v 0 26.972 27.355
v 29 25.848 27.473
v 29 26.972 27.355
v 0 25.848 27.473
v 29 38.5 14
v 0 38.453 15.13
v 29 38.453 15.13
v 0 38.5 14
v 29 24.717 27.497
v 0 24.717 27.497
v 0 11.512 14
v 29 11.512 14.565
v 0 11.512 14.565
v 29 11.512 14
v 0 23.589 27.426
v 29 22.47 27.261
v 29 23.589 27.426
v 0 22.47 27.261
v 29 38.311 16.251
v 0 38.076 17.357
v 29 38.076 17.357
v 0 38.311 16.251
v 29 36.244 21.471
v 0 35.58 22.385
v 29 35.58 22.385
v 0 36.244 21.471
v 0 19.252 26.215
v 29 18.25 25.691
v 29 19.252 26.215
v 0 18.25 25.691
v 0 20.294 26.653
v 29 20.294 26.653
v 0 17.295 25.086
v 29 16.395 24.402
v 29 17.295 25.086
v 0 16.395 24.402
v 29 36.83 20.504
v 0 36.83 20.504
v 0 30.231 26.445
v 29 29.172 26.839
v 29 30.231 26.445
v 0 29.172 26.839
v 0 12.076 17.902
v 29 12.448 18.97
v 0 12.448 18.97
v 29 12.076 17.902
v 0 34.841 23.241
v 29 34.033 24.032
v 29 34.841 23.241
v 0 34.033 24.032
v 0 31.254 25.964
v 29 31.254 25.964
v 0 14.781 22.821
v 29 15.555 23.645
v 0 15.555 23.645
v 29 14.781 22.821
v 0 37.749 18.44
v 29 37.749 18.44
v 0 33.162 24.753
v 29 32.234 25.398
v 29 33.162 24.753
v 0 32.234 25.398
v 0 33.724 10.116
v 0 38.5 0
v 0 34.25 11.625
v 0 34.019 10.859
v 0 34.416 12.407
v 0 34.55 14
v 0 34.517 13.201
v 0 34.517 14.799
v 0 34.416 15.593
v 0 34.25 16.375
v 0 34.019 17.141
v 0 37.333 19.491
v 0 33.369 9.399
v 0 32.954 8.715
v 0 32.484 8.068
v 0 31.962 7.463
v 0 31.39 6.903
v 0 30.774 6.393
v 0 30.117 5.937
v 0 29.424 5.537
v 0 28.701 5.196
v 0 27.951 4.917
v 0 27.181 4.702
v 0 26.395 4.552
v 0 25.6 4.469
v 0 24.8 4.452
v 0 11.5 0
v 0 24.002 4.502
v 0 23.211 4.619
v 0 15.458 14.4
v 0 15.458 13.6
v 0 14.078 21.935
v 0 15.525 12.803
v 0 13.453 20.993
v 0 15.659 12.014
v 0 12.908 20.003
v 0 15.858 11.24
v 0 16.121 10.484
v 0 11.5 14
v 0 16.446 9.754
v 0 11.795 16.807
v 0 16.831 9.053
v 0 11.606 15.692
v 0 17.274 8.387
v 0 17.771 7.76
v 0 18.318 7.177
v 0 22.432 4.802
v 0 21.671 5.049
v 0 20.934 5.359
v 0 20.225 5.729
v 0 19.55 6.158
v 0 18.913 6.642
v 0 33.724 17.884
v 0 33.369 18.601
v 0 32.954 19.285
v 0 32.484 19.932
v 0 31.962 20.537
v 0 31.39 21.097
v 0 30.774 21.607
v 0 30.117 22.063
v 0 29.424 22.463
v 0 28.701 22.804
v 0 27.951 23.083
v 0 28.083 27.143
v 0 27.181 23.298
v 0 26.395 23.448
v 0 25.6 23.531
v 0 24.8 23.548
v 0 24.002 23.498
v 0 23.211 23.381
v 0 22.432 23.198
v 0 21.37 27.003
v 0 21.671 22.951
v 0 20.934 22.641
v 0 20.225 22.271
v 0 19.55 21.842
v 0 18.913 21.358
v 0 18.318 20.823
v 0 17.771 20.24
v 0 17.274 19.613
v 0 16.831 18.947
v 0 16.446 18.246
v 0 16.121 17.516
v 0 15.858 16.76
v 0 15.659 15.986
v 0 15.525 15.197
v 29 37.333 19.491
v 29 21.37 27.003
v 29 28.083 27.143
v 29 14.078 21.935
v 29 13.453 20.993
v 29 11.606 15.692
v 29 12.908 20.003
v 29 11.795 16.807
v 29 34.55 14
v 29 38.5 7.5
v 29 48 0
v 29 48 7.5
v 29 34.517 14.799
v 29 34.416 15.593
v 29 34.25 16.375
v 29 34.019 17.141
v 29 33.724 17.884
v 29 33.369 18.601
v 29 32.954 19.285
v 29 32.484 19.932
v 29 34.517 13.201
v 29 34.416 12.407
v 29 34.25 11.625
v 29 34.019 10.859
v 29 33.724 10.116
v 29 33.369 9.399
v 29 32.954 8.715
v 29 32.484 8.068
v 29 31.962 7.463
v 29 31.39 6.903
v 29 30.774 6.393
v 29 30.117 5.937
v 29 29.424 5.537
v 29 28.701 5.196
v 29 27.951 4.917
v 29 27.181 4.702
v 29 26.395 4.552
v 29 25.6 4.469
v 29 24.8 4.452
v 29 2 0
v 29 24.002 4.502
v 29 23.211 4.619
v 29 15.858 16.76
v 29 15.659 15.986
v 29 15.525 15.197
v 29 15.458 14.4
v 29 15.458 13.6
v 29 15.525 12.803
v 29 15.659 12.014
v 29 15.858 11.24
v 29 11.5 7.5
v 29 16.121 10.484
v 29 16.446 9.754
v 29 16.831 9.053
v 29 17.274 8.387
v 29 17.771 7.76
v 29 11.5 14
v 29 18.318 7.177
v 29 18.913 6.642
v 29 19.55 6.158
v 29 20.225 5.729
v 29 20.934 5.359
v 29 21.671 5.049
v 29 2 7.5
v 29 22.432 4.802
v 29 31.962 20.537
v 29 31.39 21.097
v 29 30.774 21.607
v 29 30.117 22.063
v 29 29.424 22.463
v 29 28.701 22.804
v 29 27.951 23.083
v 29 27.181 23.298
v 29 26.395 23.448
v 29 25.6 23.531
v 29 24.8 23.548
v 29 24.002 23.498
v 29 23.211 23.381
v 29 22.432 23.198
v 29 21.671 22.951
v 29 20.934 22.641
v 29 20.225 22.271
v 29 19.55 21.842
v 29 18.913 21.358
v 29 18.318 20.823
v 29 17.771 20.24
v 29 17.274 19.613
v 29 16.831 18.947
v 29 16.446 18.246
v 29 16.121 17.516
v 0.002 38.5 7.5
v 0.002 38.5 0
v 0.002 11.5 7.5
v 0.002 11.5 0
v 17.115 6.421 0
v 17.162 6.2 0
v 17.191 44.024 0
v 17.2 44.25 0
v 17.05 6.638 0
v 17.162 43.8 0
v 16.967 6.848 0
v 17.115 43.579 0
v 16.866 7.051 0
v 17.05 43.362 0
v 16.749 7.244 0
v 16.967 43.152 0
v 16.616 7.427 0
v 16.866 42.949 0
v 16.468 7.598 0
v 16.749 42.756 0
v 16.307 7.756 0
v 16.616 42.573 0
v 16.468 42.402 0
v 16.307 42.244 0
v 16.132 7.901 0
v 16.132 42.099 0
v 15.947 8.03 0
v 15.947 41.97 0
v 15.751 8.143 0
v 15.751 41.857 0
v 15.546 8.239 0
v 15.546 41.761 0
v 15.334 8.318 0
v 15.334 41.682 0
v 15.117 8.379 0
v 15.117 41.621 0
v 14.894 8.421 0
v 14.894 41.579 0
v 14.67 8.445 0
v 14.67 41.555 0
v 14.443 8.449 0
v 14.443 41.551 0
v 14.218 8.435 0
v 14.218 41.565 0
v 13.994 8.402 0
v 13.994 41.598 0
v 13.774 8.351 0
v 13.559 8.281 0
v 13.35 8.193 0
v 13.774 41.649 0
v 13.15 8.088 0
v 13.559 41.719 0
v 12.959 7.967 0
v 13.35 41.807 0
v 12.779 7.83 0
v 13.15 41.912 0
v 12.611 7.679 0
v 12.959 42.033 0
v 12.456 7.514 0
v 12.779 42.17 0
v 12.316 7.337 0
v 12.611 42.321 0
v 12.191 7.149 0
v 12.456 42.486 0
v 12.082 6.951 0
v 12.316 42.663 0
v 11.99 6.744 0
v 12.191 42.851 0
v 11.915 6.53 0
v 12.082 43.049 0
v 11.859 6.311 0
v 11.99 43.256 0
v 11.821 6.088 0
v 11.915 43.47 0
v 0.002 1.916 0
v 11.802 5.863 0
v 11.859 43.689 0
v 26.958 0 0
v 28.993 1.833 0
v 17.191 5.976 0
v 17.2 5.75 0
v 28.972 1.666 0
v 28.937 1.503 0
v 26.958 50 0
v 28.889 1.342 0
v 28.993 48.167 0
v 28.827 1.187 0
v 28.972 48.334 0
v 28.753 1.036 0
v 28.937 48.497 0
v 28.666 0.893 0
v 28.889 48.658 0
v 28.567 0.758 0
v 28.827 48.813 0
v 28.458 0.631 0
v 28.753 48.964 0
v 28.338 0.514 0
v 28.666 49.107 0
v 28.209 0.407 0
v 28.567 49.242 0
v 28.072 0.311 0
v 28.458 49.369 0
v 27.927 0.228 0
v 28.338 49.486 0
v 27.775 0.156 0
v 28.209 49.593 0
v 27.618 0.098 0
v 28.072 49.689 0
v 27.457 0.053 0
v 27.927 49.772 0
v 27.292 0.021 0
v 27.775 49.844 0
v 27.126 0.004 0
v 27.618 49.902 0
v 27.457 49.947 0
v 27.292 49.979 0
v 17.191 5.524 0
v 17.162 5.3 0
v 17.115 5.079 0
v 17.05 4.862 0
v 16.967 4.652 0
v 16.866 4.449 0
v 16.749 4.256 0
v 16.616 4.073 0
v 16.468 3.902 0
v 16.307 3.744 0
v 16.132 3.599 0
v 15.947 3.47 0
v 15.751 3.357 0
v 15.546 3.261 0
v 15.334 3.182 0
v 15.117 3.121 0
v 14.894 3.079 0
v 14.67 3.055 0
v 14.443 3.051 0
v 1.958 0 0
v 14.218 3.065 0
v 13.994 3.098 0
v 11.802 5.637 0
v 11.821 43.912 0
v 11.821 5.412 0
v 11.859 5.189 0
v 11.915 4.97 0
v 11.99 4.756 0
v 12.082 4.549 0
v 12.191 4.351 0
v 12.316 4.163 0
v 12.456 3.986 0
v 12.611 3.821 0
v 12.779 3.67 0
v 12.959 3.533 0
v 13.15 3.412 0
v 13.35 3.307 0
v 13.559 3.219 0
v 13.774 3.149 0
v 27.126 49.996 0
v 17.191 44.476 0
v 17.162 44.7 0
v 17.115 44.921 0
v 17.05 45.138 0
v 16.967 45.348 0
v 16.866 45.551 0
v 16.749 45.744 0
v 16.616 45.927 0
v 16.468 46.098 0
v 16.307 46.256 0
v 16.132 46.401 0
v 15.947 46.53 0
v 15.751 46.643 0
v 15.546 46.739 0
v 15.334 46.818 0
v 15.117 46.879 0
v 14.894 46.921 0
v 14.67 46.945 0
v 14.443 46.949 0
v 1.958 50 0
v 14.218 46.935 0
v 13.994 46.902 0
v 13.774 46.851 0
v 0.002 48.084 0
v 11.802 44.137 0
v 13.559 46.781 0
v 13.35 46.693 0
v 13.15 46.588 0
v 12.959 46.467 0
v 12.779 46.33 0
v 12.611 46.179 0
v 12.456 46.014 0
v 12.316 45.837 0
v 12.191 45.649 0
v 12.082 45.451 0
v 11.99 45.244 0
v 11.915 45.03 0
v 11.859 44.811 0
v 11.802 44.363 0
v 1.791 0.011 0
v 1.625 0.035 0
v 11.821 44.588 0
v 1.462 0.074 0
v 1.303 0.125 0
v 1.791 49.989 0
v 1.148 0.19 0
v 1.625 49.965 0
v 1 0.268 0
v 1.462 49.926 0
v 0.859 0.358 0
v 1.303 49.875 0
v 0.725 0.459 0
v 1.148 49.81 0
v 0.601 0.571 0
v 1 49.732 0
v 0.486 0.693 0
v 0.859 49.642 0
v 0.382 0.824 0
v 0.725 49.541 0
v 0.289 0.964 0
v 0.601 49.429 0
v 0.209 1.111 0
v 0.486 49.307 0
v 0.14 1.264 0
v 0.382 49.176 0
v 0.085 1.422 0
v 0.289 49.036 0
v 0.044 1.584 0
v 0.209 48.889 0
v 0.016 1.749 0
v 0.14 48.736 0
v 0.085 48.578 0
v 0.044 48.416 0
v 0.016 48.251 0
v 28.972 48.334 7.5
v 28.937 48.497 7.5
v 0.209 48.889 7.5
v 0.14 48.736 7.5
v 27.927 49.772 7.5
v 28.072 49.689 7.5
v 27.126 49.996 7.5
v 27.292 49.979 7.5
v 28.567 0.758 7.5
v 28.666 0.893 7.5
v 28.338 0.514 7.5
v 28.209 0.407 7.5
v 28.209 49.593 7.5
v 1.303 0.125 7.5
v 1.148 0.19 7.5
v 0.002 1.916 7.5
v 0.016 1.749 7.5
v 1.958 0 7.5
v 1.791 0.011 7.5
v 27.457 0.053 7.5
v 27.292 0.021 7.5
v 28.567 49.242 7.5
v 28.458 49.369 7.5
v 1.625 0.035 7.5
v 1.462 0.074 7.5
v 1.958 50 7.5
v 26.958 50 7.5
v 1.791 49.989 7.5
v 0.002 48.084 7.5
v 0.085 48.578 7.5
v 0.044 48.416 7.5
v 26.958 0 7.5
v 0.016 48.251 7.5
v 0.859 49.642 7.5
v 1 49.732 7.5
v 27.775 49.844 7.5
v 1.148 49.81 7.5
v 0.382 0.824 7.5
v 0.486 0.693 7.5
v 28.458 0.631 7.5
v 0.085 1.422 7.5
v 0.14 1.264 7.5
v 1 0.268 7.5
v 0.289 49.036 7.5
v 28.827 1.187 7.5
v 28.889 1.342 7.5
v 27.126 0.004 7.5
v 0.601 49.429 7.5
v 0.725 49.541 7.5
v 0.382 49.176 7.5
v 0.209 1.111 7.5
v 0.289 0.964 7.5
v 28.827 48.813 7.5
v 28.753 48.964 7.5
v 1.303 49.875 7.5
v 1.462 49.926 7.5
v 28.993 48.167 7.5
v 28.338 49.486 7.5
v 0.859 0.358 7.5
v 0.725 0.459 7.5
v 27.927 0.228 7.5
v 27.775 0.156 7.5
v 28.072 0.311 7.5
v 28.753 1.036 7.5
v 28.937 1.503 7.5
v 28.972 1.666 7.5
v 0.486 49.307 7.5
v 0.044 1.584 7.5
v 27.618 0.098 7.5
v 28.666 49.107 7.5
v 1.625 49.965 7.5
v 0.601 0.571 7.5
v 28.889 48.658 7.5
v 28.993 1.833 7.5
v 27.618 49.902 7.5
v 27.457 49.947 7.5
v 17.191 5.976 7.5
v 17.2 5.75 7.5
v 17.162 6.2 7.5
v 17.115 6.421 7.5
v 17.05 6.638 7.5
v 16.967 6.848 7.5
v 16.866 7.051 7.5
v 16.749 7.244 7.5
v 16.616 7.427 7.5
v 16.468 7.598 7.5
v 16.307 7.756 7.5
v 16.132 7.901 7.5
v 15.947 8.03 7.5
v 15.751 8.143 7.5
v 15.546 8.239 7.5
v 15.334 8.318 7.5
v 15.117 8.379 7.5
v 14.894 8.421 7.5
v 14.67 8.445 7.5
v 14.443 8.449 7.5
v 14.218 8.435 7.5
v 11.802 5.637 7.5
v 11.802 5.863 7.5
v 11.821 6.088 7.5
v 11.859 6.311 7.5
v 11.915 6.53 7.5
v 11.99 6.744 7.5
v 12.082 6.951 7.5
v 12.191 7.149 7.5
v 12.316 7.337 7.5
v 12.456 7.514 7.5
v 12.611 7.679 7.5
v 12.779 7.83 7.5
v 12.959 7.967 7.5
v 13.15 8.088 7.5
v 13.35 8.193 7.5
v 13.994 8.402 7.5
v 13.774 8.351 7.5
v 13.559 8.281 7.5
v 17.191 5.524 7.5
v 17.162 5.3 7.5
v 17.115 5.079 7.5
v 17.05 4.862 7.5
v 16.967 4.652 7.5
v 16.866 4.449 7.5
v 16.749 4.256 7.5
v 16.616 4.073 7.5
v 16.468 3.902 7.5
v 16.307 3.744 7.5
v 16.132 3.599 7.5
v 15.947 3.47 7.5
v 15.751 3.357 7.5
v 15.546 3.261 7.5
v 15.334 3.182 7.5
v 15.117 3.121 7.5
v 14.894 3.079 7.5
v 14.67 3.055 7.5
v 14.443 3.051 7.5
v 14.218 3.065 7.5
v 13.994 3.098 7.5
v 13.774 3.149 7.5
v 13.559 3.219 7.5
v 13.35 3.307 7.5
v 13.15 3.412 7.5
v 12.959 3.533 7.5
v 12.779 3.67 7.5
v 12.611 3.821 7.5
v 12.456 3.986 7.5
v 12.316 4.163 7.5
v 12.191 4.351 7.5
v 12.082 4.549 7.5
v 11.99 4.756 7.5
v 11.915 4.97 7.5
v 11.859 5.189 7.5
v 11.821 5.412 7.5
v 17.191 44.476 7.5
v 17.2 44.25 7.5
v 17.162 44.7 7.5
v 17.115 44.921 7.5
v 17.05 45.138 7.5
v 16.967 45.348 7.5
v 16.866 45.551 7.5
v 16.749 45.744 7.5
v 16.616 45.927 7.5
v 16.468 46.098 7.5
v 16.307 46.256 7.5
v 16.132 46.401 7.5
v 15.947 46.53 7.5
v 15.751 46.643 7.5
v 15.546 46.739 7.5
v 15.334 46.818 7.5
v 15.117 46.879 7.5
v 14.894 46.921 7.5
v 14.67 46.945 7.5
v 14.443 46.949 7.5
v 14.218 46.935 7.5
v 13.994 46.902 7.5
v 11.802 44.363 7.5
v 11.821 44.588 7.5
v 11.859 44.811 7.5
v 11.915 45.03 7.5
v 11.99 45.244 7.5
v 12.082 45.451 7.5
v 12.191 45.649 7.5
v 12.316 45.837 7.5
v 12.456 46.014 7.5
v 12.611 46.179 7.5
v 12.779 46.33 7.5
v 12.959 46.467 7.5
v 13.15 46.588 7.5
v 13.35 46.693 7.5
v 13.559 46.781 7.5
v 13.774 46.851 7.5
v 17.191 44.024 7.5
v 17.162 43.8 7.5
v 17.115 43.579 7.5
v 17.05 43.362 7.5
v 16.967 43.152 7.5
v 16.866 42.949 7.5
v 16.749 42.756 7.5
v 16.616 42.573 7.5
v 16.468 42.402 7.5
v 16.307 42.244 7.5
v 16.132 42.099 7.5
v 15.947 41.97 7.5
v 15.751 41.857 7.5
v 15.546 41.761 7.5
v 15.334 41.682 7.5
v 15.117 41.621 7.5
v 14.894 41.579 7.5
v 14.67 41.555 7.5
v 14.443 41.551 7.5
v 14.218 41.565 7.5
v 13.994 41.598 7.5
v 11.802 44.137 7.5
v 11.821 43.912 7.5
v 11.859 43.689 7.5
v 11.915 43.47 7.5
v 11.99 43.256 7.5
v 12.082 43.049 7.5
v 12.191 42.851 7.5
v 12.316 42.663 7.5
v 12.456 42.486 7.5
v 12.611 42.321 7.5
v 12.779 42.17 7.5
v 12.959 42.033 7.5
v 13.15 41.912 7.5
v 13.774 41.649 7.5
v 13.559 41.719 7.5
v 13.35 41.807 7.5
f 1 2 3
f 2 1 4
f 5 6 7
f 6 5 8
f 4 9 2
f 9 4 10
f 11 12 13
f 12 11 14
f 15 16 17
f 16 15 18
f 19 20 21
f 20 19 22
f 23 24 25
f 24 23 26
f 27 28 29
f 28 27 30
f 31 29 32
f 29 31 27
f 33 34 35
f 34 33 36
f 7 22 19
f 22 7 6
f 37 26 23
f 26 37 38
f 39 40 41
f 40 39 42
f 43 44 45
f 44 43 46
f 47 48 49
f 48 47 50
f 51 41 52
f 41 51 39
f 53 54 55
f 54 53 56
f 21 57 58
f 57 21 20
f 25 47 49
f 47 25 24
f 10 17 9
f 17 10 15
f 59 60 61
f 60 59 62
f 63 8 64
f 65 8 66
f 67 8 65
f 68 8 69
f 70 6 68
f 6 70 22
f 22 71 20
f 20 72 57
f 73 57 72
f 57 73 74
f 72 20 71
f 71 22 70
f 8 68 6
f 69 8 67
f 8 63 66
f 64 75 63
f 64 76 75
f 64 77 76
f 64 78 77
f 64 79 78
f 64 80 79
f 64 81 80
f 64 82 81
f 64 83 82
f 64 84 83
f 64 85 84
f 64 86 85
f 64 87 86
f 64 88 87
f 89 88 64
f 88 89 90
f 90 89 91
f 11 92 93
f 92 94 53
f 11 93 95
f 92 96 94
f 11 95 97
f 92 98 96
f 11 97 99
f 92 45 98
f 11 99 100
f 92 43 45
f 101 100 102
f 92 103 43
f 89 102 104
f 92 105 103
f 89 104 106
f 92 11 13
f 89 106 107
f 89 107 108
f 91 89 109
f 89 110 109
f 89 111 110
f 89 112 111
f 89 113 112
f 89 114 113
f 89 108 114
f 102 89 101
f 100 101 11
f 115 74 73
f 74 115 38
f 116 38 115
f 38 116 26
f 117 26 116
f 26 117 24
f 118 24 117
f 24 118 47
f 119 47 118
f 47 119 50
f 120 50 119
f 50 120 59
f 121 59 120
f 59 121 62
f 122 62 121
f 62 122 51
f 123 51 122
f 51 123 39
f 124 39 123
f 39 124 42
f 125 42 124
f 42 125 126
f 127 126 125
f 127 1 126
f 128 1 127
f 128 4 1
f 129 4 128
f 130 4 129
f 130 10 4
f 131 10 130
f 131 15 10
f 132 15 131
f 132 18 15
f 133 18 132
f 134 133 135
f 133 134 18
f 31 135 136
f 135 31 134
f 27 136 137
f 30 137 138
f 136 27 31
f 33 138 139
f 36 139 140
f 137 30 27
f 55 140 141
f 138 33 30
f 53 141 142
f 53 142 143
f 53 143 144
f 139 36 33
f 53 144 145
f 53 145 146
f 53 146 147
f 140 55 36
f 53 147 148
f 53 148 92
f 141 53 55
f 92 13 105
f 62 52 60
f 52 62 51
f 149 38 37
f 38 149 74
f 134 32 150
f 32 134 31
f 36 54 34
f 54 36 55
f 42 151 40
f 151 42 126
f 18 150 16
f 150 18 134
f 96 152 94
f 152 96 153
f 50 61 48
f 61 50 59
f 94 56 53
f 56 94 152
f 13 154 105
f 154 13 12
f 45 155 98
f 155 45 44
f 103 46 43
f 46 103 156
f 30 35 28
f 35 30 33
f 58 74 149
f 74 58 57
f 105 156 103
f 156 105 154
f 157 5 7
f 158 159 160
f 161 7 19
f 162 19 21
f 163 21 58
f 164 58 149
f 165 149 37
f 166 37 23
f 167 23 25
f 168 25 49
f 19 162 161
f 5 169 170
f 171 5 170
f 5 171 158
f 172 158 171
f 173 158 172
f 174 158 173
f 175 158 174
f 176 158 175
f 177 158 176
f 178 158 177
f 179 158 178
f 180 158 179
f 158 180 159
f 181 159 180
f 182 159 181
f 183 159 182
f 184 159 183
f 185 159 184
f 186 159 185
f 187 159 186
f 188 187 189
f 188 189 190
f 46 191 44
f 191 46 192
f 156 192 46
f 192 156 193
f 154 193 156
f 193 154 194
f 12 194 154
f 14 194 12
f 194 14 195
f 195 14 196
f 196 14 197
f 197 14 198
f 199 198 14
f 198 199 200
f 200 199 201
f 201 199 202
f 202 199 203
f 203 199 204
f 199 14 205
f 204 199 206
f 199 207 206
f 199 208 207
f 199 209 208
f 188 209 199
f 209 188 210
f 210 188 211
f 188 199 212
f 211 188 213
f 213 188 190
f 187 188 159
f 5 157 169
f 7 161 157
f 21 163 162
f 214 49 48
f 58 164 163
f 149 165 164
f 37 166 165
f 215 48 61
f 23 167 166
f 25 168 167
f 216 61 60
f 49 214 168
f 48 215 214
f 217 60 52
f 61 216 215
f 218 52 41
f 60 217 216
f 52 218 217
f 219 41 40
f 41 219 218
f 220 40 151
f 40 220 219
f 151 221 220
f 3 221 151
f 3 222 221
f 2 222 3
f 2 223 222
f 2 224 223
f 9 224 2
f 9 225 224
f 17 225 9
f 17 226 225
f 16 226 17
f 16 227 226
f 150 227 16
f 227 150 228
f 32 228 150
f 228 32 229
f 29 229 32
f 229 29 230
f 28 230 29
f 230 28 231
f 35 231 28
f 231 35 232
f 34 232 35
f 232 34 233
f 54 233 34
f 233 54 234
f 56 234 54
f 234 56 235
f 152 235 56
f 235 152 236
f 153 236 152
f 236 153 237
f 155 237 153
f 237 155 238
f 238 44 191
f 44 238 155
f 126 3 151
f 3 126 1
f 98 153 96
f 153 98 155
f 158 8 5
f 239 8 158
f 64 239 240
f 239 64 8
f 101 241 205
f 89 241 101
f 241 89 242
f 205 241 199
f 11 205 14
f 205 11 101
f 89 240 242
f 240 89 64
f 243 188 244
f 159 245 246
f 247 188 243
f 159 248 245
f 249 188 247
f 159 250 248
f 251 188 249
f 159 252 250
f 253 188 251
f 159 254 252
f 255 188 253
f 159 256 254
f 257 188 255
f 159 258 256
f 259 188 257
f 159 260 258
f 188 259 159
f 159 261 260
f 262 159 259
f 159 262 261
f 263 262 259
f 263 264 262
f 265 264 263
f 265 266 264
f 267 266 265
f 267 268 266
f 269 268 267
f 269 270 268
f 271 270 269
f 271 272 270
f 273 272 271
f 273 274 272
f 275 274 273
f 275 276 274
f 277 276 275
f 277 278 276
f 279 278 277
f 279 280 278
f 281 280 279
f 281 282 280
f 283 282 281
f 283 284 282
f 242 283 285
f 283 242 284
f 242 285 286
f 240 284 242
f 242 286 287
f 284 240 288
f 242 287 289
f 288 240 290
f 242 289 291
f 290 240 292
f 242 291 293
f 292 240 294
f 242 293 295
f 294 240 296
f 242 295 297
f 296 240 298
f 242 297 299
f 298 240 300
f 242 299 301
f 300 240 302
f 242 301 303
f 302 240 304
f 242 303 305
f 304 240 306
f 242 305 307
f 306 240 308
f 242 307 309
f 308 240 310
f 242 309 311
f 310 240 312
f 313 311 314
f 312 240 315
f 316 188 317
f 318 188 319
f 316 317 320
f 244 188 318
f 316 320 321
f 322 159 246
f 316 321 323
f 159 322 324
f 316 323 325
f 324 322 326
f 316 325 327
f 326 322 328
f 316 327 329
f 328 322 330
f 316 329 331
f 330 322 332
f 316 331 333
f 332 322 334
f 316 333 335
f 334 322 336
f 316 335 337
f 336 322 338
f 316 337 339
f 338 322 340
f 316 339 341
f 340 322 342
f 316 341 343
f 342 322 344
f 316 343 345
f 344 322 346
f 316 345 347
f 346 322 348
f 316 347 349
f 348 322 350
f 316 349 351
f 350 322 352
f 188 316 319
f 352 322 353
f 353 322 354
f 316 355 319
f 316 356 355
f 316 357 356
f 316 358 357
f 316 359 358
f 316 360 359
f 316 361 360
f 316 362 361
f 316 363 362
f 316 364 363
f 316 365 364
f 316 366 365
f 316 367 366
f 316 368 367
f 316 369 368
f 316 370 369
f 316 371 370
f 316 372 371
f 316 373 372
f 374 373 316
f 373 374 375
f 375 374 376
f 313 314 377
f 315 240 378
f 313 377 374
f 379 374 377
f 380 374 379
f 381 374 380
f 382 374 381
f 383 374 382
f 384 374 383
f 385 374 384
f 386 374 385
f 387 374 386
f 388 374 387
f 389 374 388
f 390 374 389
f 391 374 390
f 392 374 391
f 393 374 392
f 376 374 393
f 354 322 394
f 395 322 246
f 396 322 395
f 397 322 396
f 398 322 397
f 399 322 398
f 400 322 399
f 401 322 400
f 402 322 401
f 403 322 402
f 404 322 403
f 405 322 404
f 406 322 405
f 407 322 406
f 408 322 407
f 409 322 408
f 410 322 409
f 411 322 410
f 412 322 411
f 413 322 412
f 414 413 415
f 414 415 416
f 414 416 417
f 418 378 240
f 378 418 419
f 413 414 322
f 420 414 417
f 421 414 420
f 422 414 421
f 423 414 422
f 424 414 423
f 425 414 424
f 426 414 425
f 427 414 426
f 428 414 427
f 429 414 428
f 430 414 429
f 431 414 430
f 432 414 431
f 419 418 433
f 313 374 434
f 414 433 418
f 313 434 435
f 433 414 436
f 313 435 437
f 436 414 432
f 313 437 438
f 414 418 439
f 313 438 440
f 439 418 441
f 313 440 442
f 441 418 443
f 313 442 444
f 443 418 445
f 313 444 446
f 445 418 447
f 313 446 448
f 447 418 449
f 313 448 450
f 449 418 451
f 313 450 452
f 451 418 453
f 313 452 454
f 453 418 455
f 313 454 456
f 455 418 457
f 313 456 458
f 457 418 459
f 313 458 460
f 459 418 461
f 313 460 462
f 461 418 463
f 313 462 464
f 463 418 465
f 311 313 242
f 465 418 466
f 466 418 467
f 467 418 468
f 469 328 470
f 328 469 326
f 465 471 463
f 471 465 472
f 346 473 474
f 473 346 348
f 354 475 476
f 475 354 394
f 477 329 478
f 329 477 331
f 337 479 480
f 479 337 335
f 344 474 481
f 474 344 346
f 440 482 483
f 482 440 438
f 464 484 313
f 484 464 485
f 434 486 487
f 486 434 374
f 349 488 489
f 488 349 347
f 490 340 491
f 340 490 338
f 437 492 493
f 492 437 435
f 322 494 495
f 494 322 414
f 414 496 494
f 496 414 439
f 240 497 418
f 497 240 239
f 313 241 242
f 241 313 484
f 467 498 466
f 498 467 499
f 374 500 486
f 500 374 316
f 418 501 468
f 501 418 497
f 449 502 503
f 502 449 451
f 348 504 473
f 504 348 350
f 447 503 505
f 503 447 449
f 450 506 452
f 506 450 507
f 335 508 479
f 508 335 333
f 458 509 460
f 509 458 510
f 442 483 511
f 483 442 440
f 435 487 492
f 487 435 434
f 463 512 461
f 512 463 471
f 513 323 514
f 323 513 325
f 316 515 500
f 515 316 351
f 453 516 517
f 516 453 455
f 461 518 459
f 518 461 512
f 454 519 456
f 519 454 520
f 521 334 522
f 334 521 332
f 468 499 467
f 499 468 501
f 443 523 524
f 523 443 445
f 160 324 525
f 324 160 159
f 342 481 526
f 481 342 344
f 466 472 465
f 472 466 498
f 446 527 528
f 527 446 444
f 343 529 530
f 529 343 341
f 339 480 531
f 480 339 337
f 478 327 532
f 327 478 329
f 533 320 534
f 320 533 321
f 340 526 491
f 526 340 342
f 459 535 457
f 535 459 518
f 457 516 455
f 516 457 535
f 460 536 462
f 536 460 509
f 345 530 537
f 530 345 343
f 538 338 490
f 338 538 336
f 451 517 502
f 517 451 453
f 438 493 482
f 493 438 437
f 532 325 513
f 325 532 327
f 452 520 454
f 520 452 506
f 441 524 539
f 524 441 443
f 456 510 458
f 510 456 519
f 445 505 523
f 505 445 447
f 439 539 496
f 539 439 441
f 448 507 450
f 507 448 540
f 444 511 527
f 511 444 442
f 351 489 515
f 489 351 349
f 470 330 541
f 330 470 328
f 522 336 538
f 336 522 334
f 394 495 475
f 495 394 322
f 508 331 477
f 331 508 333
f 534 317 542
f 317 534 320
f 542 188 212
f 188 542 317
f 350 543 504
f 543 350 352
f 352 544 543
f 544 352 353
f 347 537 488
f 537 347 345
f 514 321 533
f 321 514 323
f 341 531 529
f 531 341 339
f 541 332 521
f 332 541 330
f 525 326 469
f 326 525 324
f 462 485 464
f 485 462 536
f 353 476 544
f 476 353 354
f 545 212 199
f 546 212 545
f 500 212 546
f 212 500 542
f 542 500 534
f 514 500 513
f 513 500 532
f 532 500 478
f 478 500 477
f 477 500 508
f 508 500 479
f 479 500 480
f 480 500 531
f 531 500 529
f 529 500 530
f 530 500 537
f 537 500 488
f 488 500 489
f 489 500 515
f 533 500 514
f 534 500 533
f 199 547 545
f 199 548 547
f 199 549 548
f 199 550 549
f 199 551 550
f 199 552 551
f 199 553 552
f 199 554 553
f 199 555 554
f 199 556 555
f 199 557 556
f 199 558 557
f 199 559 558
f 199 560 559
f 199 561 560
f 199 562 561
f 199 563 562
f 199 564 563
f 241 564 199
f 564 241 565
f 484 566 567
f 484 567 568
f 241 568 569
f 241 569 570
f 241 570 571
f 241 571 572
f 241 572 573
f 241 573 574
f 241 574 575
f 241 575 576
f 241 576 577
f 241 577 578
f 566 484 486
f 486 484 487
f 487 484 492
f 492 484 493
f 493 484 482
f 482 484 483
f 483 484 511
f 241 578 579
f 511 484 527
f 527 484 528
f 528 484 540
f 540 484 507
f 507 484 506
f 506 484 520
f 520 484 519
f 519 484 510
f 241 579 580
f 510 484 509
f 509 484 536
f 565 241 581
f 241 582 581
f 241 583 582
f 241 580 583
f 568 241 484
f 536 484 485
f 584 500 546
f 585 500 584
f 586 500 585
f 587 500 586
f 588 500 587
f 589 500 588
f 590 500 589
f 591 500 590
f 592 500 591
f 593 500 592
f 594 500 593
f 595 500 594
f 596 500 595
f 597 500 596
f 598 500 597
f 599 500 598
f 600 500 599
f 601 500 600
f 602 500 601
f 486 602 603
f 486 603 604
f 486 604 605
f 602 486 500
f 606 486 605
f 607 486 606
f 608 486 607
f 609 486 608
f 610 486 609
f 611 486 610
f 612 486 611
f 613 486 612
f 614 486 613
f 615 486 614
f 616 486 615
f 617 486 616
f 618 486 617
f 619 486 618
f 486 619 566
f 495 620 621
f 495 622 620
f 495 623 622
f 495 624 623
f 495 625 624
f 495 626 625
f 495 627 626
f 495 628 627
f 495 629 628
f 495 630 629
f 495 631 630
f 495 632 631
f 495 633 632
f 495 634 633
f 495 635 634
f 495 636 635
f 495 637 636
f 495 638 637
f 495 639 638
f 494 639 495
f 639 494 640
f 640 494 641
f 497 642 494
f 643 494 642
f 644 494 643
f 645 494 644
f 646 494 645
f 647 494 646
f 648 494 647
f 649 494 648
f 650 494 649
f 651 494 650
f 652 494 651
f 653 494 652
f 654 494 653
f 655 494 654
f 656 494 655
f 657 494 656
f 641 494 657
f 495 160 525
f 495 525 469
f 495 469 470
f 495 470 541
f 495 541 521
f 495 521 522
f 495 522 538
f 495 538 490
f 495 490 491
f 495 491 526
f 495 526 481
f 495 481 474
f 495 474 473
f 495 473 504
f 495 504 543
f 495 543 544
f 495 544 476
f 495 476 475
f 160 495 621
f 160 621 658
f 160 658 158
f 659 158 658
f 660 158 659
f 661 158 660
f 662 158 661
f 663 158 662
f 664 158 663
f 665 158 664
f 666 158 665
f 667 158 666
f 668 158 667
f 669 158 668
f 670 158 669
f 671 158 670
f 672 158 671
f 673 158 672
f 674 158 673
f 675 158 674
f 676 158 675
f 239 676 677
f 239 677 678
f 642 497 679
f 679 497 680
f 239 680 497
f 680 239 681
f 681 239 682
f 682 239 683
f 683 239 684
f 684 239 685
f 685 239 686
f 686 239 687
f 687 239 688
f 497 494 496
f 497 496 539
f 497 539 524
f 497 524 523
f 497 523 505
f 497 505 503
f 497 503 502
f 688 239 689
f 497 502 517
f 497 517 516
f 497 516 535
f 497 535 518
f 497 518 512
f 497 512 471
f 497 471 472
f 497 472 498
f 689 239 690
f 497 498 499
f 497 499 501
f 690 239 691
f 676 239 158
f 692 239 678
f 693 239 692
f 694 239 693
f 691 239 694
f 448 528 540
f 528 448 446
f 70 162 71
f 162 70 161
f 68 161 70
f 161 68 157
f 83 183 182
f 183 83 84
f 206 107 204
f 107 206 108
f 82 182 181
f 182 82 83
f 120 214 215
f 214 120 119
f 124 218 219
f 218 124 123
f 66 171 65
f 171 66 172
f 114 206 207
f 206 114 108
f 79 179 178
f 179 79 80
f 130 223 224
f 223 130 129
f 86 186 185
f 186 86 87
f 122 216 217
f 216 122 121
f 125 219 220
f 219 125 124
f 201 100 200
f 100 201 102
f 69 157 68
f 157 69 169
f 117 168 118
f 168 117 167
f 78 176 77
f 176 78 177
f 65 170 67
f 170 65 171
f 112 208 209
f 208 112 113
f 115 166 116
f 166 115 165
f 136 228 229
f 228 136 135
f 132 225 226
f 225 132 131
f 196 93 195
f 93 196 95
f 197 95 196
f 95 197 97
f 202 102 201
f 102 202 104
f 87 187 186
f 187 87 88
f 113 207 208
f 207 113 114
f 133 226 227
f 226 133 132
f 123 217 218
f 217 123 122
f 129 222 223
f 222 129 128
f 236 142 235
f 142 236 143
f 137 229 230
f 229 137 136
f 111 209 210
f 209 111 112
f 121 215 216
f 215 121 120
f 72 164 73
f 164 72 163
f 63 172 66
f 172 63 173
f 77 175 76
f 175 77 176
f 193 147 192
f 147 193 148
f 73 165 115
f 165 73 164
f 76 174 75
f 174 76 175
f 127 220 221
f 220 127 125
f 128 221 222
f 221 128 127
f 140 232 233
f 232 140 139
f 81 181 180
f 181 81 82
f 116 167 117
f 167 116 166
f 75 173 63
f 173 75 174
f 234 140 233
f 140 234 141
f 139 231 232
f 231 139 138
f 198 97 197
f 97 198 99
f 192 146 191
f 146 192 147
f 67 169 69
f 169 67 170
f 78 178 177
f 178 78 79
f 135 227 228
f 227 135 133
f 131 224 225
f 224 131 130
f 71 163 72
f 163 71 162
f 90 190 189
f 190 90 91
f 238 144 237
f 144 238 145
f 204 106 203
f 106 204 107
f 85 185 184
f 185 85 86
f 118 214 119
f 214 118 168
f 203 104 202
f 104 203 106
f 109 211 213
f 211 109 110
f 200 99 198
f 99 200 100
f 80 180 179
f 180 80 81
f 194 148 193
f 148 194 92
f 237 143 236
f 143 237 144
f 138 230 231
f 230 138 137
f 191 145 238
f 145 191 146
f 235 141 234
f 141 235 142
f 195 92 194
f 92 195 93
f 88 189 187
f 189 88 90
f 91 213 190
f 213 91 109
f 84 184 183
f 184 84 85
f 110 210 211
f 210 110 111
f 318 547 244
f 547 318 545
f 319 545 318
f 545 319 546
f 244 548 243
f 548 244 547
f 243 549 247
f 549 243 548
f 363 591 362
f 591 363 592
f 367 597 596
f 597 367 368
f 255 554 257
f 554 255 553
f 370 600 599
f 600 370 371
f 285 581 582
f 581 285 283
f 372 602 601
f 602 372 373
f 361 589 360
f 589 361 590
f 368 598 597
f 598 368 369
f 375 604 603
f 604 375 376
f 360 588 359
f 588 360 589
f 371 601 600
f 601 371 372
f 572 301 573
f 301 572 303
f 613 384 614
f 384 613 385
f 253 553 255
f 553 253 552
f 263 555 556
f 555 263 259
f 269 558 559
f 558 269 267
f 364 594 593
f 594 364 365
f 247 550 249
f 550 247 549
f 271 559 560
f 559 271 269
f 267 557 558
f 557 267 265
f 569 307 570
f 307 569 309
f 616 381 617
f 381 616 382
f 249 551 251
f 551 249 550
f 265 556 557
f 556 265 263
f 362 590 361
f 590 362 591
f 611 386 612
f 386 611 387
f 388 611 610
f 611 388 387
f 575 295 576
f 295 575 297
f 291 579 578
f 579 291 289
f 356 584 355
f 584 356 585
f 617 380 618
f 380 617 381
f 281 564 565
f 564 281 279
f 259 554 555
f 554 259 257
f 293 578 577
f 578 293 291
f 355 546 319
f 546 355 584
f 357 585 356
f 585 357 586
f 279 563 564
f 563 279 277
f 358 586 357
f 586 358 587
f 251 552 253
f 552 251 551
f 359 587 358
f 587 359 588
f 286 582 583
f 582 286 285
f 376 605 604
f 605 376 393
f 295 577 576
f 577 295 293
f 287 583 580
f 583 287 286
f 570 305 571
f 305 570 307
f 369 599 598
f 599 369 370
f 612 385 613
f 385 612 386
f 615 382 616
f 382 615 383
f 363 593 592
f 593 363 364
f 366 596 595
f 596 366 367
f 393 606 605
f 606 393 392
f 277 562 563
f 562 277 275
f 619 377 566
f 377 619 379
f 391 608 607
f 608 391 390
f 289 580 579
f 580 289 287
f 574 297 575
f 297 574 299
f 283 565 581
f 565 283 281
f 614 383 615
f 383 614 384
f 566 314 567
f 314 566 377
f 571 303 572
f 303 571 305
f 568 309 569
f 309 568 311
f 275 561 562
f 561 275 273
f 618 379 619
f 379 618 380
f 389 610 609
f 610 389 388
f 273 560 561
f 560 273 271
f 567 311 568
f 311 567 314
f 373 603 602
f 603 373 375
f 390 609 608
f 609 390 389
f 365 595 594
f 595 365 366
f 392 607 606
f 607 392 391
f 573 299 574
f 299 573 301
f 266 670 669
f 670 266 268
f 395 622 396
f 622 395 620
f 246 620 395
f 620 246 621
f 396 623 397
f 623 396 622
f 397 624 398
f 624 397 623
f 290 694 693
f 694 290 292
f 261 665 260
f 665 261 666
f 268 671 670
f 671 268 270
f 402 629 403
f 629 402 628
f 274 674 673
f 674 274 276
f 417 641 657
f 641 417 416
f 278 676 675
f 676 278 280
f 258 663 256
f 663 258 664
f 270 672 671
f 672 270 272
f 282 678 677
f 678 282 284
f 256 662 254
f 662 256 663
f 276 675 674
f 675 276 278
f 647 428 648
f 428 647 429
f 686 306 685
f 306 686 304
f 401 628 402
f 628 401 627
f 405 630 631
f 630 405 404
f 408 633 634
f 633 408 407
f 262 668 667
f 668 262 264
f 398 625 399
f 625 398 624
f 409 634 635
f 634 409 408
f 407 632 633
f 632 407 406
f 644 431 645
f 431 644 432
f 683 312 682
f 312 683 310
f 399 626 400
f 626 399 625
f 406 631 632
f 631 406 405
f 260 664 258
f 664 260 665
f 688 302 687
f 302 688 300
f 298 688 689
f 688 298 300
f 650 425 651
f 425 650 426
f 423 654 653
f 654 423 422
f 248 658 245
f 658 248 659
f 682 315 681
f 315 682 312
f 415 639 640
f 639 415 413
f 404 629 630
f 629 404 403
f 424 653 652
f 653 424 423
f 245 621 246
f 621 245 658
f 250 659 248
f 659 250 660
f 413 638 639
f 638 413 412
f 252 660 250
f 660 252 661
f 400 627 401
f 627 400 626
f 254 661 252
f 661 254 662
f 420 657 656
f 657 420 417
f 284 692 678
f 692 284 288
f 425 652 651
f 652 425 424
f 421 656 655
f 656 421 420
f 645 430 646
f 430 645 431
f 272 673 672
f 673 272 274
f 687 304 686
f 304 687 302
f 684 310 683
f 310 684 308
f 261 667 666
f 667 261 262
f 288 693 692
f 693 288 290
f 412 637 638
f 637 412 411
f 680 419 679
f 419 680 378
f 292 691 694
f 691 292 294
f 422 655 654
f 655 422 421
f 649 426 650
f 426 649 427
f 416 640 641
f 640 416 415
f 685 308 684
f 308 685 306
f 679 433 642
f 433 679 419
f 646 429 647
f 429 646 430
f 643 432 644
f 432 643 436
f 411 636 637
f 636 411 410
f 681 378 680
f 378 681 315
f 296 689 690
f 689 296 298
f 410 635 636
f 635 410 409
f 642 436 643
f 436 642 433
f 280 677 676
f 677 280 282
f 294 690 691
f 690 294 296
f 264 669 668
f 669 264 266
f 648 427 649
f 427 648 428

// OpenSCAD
$fn=75;

x1 = 29.0;
y1 = 50.0;
z1 = 7.5;

x2 = 27.0;
//y2 = 22 - 10 + 1;
y2 = 22 - 10 + 2;
z2 = x1;

rBearing = 19.1 / 2;
rBolt = 5.4 / 2;

BearingHolder();

module BearingHolder()
{
    difference()
    {
        union()
        {
            BearingsHolder();
            translate([0, y1 / 2 - x2 / 2, 0]) rotate([90, 0, 90]) BearingsSlot();
        }
        // dziury
        union()
        {
            translate([0, y1 / 2 - x2 / 2, 0]) rotate([90, 0, 90]) translate([x2 / 2, y2, 0]) cylinder(h = x1, r = rBearing, center = false);

            translate([x1 / 2, (y1 - x2) / 2 / 2, 0]) cylinder(h = z1, r = rBolt, center = false);
            translate([x1 / 2, y1 - ((y1 - x2) / 2 / 2), 0]) cylinder(h = z1, r = rBolt, center = false);
        }
    }
}

module RoundedCubeEx(x_, y_, z_, r_)
{
    hull ()
    { 
        translate ([r_, r_, z_ / 2]) cylinder(h = z_, r = r_, center = true);
        translate ([x_ - r_, r_, z_ / 2]) cylinder(h = z_, r = r_, center = true);
        translate ([x_ - r_, y_ -r_, z_ / 2]) cylinder(h = z_, r = r_, center = true);
        translate ([r_, y_ - r_, z_ / 2]) cylinder(h = z_, r = r_, center = true);
    }
}

module BearingsSlot()
{
    difference()
    {
        union()
        {
            translate([x2 / 2, y2, 0]) cylinder(h = z2, r = x2 / 2, center = false);
            cube([x2, y2, z2]);
        }
        translate([0, -5, 0]) cube([x2, 5, z2]);
    }
}

module BearingsHolder()
{
    RoundedCubeEx(x1, y1, z1, 2);
}
